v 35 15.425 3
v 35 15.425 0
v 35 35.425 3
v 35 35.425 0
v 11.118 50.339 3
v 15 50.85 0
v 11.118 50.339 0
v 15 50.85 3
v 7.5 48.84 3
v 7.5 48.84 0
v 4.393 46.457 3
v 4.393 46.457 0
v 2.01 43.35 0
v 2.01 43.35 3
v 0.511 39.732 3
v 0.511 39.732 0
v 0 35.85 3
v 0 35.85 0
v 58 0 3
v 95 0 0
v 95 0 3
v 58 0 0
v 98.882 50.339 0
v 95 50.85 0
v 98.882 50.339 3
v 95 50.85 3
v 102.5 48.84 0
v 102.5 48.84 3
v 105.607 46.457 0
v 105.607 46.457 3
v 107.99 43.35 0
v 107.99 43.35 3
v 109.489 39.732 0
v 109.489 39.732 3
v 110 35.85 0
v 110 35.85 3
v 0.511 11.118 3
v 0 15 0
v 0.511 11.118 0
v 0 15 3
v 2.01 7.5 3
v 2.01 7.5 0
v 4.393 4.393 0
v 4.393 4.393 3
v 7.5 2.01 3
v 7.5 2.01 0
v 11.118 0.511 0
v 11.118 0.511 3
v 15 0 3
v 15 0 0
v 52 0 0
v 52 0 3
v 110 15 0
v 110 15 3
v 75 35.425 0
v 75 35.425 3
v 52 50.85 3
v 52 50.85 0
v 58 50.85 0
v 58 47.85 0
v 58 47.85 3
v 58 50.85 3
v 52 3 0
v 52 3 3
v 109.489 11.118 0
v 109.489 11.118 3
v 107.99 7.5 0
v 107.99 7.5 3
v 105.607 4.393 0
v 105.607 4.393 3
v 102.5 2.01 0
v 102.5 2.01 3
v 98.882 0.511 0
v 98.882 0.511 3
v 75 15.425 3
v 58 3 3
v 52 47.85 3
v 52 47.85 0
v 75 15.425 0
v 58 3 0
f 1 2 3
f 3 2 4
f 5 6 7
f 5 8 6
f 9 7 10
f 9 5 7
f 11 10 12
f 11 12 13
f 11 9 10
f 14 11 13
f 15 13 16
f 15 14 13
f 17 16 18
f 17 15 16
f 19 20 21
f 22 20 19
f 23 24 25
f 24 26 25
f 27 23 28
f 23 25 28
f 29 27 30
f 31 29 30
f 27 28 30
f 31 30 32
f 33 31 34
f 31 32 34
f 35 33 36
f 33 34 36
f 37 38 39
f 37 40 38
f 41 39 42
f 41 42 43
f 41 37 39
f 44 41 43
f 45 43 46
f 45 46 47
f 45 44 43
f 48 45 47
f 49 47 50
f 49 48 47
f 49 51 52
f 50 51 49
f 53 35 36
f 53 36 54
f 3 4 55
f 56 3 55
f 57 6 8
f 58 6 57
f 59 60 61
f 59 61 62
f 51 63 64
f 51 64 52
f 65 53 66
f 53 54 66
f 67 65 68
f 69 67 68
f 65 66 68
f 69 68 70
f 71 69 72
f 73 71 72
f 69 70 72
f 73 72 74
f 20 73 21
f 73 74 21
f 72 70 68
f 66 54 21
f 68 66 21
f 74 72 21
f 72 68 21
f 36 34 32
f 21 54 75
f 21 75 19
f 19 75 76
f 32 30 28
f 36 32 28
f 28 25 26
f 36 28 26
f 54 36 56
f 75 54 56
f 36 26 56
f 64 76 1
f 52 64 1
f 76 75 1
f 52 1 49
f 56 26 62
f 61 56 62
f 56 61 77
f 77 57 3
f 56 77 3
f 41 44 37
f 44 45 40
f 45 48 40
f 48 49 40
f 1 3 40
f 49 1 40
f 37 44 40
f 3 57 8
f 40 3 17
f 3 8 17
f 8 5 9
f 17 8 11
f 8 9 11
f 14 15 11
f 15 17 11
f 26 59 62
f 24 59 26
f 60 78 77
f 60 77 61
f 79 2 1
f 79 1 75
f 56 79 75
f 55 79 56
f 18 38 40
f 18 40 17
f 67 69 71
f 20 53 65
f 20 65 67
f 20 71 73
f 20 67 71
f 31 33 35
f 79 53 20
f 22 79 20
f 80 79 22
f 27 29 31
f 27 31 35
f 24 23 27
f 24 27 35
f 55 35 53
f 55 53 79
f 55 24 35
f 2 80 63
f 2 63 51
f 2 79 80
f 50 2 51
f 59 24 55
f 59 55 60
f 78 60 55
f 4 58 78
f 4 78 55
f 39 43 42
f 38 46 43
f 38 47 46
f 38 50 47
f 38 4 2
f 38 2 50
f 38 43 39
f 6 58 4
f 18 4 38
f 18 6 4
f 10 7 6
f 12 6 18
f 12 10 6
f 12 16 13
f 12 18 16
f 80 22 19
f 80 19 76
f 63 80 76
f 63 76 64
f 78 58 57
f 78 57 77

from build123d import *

# Parameters (mm, degrees)
SKETCH1_W           = 40
SKETCH1_H           = 20
BOSS_EXTRUDE1_DEPTH = 3
FILLET1_R           = 15


with BuildPart() as part:
    # Sketch1 → Boss-Extrude1 (new body)
    with BuildSketch(Plane.XY):
        Polygon((52, 50.85), (52, 47.85), (58, 47.85), (58, 50.85), (110, 50.85), (110, 0), (58, 0), (58, 3), (52, 3), (52, 0), (0, 0), (0, 50.85), align=None)
        with Locations((55, 25.425)):
            Rectangle(SKETCH1_W, SKETCH1_H, mode=Mode.SUBTRACT)
    extrude(amount=BOSS_EXTRUDE1_DEPTH)

    # Fillet1
    fillet1_edges = [part.edges().sort_by_distance(p)[0] for p in [
        (0, 0, 1.5),
        (110, 0, 1.5),
        (110, 50.85, 1.5),
        (0, 50.85, 1.5),
    ]]
    fillet(fillet1_edges, radius=FILLET1_R)


solid = part.part
